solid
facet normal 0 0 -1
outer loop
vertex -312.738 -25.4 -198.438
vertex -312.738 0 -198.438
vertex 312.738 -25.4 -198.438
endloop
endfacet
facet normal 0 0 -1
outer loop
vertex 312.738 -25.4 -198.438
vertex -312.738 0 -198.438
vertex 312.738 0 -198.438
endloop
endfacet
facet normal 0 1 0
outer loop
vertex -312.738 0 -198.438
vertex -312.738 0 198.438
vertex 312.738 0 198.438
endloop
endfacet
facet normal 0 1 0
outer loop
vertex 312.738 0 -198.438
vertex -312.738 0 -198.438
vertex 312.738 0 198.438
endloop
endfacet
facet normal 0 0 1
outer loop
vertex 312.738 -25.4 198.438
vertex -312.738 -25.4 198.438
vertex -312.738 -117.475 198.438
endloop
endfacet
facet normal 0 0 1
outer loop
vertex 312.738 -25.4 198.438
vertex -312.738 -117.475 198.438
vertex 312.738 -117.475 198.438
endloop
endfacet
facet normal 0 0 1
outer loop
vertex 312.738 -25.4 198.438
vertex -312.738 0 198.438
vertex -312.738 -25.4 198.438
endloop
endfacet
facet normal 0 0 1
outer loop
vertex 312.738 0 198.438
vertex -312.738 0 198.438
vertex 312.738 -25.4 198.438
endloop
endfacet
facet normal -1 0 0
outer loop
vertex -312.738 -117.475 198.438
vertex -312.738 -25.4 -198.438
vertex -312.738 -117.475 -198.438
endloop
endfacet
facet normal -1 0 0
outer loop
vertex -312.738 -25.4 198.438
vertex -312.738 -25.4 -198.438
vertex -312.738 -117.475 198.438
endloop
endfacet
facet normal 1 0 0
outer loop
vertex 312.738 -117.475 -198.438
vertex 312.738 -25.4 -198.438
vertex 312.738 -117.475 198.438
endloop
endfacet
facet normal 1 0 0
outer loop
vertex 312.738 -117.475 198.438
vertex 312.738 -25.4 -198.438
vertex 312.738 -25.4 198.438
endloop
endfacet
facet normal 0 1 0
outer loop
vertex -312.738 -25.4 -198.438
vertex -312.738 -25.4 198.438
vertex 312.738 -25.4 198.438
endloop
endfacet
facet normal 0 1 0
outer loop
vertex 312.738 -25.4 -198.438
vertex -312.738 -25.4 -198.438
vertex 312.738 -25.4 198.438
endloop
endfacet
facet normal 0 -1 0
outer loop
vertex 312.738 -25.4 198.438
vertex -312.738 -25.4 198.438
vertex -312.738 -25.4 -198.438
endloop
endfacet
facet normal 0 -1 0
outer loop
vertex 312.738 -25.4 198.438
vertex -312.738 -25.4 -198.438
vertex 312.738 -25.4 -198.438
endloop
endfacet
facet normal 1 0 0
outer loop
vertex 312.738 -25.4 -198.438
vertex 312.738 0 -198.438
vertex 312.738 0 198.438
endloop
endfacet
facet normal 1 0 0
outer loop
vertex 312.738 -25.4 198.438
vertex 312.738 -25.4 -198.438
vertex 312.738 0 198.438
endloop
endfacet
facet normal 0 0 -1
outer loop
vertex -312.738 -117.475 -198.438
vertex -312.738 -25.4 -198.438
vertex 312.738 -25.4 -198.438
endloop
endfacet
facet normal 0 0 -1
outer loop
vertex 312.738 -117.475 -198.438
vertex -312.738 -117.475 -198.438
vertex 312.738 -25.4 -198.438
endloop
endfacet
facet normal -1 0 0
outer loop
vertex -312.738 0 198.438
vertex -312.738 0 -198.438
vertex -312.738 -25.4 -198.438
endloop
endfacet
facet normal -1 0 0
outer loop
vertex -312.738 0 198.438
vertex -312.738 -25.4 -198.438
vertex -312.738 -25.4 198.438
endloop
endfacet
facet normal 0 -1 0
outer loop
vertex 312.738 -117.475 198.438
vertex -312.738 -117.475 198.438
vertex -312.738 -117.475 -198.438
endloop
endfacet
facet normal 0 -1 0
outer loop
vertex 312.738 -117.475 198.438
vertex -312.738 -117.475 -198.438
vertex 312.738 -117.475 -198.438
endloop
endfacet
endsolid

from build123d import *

# Parameters (mm, degrees)
F0_W     = 625.475
F0_H     = 396.875
F1_DEPTH = 25.4
F2_W     = 625.475
F2_H     = 396.875
F3_DEPTH = 92.075


with BuildPart() as f1:
    # F0 (on Front) → F1 (new body)
    with BuildSketch(Plane.XZ):
        Rectangle(F0_W, F0_H)
    extrude(amount=F1_DEPTH)


with BuildPart() as f3:
    # F2 (on face) → F3 (new body)
    with BuildSketch(Plane.XZ.offset(25.4)):
        Rectangle(F2_W, F2_H)
    extrude(amount=F3_DEPTH)


solid = Compound([f1.part, f3.part])
